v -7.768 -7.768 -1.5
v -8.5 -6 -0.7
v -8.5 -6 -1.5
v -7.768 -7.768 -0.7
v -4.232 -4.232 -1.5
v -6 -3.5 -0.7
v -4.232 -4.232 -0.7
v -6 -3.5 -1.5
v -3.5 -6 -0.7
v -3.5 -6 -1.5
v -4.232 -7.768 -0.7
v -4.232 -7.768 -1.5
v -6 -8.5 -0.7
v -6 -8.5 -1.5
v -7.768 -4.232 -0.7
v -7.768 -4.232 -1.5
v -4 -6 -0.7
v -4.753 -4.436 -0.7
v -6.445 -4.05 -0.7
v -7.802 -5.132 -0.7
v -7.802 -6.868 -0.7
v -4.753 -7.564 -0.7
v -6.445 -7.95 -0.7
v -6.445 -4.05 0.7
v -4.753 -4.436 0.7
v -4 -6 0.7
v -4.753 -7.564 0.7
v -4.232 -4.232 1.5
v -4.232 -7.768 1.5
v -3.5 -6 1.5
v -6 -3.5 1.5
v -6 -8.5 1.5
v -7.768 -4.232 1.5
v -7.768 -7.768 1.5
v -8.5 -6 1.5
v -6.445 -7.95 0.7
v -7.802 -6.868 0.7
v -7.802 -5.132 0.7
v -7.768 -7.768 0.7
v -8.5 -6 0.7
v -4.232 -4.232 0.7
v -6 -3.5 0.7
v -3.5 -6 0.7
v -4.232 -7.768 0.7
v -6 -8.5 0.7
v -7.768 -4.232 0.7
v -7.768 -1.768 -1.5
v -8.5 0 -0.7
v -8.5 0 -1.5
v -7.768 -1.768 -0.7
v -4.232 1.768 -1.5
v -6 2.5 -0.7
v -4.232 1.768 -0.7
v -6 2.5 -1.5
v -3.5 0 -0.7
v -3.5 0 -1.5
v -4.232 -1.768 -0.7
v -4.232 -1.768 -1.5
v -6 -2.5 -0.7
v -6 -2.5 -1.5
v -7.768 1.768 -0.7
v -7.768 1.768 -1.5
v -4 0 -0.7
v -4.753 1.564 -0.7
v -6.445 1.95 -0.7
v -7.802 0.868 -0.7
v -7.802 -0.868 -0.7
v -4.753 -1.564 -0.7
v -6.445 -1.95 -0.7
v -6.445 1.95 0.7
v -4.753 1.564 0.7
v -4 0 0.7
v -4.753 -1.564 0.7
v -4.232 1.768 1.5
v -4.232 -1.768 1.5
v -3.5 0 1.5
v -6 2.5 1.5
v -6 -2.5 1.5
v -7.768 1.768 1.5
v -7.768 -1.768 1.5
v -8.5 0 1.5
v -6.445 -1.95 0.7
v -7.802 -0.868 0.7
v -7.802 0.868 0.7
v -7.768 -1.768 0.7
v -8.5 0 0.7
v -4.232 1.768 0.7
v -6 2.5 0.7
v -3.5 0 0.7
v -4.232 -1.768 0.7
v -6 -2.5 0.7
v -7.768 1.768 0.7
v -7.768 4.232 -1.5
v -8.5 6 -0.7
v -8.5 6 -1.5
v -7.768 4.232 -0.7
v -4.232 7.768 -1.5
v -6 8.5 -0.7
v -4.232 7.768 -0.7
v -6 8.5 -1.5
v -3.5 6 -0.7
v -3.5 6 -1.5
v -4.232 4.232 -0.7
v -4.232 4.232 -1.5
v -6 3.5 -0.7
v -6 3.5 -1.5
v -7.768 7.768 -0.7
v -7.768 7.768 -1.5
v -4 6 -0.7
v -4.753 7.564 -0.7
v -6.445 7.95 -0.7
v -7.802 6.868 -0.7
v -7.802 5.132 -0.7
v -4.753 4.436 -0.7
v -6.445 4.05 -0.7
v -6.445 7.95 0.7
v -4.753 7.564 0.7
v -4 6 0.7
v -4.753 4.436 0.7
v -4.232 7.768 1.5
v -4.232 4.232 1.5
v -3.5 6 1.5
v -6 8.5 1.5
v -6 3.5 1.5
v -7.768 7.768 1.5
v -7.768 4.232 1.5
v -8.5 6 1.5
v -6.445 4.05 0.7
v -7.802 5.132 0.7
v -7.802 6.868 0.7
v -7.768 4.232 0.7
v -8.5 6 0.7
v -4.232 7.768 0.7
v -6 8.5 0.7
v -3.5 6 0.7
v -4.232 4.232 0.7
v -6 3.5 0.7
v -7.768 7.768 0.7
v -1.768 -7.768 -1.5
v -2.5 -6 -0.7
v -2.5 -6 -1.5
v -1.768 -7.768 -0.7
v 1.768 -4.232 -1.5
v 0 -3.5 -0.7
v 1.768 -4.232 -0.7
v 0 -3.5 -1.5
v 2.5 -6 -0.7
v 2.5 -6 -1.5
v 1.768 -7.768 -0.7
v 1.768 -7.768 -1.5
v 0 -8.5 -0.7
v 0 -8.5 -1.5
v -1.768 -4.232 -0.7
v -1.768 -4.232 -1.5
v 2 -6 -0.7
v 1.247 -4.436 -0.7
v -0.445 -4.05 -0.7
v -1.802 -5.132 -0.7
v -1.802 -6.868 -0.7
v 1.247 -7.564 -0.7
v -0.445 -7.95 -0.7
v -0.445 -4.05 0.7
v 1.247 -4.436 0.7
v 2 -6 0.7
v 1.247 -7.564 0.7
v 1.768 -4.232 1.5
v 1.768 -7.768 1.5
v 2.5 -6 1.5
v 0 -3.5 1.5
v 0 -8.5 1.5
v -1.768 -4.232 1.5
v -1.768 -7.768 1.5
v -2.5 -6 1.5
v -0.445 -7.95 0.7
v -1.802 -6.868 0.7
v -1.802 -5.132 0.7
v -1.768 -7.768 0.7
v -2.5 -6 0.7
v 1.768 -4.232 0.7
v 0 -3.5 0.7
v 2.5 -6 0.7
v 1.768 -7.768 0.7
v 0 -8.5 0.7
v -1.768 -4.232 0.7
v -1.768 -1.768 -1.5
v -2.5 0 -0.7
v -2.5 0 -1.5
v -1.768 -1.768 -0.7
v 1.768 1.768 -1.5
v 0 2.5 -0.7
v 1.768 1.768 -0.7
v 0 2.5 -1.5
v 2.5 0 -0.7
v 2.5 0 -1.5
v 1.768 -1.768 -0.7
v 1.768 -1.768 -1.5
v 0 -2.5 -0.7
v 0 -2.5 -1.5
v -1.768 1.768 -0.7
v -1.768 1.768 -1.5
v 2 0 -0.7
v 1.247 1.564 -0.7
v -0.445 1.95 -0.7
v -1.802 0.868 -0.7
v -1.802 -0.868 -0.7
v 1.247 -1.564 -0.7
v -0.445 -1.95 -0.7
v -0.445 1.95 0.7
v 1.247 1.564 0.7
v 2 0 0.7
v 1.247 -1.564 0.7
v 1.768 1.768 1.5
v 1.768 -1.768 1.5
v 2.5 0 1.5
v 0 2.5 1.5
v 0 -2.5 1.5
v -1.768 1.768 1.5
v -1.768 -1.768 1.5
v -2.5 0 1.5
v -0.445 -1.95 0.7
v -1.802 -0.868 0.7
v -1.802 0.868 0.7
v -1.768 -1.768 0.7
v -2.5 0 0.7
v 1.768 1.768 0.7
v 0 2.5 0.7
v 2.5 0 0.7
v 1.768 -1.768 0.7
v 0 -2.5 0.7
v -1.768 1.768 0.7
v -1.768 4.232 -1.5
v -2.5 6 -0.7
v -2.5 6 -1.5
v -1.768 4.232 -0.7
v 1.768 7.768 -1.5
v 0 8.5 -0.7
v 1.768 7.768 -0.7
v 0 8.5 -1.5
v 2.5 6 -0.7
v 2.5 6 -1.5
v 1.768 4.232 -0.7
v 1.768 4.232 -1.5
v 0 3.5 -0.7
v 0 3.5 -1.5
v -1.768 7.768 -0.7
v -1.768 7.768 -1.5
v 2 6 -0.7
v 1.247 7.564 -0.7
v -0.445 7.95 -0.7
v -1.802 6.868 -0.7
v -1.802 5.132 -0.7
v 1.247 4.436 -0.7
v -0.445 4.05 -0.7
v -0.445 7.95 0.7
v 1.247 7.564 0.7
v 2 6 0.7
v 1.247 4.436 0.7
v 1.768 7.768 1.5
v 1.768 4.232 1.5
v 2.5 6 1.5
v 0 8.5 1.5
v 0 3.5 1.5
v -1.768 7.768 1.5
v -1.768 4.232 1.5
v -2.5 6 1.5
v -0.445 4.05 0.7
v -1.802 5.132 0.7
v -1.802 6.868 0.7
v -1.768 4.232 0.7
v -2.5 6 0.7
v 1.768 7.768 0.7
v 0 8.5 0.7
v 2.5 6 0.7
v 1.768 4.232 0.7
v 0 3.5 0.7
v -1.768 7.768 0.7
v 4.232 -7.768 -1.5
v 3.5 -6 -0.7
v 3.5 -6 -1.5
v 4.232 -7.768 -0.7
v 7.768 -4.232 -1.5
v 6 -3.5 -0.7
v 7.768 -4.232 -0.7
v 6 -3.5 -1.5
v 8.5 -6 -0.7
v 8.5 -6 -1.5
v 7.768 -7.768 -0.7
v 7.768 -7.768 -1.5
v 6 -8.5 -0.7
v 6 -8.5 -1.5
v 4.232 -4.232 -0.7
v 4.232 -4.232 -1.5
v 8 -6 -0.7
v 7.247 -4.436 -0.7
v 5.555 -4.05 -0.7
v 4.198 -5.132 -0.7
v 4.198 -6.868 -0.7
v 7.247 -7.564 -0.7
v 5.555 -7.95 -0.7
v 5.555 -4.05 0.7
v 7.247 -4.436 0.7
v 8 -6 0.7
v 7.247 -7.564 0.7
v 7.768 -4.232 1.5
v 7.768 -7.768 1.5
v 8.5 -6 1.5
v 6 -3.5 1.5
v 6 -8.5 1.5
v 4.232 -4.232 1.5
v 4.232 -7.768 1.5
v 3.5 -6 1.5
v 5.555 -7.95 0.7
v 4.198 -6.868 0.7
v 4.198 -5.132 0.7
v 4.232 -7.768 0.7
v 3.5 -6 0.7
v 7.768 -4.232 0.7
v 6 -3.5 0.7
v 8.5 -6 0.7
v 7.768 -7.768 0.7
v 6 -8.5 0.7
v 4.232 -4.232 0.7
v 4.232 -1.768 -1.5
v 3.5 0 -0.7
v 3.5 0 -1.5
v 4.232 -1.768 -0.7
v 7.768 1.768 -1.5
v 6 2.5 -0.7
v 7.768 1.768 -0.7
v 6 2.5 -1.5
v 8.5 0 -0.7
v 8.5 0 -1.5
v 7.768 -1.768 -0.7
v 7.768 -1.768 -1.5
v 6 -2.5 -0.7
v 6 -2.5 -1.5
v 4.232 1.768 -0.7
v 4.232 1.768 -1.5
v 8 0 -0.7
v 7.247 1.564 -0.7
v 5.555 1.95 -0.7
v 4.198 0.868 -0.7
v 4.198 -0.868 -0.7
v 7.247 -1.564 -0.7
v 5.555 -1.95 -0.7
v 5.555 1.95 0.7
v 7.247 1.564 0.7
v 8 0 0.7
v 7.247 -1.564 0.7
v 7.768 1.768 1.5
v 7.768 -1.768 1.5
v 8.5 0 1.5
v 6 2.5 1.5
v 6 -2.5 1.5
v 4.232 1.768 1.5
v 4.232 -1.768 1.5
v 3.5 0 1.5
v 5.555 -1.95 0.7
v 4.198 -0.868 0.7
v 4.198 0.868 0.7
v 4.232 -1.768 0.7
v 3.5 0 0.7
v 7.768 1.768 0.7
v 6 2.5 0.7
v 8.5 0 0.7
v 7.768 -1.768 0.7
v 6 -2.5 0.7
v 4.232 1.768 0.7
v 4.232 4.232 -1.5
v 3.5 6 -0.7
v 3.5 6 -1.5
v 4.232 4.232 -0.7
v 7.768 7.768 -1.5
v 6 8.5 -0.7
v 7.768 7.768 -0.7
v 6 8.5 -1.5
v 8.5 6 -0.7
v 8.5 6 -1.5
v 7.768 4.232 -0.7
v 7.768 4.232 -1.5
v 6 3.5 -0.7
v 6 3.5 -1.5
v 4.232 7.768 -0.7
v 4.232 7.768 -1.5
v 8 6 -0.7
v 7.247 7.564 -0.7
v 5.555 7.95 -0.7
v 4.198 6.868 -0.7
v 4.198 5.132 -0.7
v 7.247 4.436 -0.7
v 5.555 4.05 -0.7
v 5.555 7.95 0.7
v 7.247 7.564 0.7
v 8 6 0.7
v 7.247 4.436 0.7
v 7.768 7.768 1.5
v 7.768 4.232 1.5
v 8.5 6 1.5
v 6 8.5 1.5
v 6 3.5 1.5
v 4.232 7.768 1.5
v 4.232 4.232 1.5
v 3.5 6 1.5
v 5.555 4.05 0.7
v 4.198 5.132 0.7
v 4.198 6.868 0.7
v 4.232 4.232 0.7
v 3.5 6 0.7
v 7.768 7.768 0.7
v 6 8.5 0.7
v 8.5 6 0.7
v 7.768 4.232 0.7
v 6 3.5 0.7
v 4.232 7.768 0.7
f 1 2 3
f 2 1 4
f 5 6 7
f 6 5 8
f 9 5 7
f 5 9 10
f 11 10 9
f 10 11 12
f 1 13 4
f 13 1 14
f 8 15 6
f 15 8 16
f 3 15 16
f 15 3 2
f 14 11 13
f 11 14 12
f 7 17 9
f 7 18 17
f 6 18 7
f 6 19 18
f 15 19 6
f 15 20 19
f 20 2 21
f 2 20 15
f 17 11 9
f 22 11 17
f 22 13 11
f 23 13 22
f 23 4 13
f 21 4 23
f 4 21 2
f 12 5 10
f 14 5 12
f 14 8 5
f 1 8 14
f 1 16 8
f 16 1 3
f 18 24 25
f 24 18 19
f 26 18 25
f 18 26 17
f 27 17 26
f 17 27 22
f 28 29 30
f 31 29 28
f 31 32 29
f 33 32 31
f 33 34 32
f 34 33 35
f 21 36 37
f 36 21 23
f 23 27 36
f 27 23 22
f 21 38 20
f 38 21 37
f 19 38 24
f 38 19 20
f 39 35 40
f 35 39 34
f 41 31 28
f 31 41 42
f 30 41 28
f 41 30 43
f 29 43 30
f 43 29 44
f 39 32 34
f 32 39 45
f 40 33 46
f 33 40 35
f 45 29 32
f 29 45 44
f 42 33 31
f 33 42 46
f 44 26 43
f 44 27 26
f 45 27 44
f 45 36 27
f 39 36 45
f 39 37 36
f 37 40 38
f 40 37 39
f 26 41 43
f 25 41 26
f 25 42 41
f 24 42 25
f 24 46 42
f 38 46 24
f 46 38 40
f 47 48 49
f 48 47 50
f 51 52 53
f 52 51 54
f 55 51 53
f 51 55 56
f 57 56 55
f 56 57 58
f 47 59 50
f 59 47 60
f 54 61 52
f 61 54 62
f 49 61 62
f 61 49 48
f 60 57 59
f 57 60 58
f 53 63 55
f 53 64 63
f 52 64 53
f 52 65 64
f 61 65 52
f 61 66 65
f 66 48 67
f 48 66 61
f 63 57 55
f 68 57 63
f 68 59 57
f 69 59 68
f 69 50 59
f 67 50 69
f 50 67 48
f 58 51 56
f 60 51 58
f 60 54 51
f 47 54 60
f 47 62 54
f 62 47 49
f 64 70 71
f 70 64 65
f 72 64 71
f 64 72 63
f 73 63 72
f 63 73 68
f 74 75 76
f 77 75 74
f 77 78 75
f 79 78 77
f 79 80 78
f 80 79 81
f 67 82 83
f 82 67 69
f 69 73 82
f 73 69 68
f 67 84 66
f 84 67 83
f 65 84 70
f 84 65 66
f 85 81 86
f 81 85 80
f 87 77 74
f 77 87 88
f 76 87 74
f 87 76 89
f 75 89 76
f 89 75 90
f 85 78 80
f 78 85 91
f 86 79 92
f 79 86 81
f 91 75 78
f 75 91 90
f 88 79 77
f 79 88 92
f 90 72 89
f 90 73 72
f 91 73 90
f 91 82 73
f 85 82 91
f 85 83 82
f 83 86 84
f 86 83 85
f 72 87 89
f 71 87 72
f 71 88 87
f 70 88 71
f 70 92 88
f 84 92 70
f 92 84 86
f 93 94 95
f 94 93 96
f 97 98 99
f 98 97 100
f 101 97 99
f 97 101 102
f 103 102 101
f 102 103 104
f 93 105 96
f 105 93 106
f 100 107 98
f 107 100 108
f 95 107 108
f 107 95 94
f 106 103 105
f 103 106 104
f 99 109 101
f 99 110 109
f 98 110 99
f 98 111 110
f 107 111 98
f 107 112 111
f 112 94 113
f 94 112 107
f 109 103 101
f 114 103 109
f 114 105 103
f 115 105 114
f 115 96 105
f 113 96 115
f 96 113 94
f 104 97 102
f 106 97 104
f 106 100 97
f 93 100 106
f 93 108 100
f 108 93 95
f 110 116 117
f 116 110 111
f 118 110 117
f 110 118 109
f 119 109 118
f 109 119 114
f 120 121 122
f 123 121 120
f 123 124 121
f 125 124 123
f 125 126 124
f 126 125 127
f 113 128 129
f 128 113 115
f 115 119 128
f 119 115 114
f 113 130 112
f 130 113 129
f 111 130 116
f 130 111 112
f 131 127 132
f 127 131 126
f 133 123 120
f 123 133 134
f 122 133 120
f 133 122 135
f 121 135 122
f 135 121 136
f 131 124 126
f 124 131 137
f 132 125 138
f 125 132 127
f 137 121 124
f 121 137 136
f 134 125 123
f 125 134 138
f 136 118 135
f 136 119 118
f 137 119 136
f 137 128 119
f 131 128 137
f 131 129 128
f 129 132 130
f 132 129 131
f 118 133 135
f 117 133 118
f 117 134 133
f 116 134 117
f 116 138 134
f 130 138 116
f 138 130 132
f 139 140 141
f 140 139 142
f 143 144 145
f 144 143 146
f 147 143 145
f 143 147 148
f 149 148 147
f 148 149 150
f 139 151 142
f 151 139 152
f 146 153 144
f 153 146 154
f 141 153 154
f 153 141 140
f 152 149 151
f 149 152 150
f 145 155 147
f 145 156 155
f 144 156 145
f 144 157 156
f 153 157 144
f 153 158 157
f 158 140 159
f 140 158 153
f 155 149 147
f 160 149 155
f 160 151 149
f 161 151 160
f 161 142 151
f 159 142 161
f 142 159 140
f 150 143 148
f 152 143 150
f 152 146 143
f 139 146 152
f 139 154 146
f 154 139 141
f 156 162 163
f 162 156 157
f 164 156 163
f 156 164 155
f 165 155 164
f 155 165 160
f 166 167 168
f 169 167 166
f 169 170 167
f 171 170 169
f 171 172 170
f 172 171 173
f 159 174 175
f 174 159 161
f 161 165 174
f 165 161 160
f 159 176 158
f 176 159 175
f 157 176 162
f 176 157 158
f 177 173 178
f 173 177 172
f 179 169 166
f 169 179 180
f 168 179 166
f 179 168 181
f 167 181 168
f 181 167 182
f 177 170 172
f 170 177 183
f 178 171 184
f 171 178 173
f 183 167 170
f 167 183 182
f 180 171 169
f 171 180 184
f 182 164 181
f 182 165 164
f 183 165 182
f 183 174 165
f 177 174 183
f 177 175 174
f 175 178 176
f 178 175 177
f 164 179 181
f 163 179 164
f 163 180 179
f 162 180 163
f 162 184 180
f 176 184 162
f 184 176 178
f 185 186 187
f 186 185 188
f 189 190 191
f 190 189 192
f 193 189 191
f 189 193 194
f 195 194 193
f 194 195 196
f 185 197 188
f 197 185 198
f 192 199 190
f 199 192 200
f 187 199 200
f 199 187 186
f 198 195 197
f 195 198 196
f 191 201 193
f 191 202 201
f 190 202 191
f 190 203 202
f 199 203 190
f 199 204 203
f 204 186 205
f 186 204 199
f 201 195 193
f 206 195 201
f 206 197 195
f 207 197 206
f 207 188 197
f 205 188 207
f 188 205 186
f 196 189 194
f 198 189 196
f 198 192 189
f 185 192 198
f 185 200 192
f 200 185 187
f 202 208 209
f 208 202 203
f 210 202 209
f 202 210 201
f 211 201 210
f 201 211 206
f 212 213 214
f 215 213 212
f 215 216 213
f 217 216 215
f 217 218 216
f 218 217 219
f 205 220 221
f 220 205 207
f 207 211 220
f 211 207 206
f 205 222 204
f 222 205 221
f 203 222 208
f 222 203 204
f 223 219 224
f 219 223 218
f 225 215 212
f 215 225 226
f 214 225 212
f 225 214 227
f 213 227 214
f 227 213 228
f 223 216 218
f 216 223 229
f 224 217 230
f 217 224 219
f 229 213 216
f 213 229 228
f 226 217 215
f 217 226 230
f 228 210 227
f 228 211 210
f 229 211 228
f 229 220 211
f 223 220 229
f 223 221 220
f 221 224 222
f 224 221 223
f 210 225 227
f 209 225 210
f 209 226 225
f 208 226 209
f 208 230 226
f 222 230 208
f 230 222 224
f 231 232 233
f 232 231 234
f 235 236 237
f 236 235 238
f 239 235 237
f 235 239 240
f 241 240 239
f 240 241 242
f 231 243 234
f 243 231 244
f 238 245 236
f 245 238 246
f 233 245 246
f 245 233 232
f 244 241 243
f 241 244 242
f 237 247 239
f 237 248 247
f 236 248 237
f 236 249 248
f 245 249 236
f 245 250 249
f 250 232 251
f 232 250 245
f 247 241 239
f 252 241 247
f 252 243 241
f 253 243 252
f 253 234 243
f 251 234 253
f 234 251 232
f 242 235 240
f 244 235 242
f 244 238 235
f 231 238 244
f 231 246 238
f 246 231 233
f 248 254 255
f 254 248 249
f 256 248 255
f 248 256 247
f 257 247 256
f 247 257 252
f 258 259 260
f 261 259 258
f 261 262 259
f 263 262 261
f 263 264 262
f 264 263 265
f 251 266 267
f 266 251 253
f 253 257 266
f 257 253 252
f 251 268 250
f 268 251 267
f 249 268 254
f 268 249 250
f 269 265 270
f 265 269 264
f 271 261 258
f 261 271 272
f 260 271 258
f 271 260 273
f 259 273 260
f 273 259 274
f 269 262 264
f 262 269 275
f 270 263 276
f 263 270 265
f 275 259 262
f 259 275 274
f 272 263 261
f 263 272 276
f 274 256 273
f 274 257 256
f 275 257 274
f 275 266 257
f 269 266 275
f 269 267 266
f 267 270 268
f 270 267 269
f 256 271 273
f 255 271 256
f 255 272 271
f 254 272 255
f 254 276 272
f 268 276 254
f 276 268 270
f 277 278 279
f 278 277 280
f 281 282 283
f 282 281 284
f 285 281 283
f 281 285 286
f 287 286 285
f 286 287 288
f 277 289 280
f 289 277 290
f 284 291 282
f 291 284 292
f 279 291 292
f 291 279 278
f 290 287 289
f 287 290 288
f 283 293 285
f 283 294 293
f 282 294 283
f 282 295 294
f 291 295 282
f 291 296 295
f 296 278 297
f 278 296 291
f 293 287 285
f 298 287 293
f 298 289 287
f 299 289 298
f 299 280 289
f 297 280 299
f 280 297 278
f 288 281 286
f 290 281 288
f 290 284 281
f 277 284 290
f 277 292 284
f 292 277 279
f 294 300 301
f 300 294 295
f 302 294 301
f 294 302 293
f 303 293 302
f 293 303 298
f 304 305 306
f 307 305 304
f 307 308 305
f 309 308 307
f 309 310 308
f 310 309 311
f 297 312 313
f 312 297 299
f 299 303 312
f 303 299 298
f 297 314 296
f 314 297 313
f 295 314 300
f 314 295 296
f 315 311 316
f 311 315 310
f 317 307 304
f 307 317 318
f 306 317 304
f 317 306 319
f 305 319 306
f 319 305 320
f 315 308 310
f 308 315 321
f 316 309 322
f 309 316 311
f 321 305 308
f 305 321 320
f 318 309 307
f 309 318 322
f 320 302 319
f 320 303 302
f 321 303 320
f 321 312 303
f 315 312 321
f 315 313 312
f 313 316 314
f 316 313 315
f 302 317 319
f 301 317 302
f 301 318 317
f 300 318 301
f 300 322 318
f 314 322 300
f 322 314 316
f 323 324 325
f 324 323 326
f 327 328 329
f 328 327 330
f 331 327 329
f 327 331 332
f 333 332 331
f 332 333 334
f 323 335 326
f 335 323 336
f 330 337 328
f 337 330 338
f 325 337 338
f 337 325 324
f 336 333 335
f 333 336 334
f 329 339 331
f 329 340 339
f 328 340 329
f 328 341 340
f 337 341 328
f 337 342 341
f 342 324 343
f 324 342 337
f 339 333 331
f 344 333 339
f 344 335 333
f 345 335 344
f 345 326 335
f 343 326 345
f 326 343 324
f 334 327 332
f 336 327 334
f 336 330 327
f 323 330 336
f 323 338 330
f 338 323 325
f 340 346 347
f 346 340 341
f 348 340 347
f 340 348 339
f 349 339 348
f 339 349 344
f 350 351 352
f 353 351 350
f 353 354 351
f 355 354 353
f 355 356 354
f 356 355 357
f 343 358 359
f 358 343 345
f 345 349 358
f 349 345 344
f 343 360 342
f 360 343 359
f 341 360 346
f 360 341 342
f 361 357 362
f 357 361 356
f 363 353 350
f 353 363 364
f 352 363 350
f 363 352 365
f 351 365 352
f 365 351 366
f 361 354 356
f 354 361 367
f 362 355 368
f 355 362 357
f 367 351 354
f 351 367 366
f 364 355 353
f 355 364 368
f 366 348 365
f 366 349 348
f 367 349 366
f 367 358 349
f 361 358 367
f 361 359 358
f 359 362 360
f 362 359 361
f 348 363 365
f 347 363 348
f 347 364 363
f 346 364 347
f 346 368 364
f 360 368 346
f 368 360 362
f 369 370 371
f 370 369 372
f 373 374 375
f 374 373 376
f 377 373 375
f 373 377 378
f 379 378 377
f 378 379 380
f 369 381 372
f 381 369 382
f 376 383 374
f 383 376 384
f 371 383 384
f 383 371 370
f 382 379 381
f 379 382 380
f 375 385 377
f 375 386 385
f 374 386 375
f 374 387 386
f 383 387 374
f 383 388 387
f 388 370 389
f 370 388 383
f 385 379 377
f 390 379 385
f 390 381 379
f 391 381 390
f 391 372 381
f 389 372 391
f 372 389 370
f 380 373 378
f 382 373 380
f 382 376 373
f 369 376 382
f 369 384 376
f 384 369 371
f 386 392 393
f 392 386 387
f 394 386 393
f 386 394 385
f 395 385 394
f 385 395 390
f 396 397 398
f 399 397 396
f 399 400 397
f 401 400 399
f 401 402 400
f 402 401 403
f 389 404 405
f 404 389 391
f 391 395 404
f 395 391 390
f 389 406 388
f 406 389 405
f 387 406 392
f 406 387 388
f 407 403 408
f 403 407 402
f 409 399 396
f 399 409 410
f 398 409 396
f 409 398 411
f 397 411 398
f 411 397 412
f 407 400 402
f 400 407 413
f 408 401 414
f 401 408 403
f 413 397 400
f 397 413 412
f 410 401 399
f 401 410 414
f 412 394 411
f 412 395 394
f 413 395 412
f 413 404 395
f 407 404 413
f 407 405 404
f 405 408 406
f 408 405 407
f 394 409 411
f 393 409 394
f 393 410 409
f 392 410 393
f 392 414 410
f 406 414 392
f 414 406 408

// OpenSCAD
// file: ollo_def.scad
// Diameter of the body of Ollo Rivet
OlloInDiameter = 4;

// Diameter of the tip of Ollo Rivet
OlloOutDiameter = 5;

// Depth of one layer of Ollo Rivet
OlloLayerThickness = 3;

// Depth of tip of Ollo Rivet
OlloTipThickness = 0.8;

// Distance between two Ollo holes centers
OlloSpacing = 6;

// Functions
function ollo_nLayer_thickness(nLayer) = nLayer*OlloLayerThickness;
// main file
include <ollo_def.scad>;

// One Ollo hole
module olloHole(nLayer=1, outerBottom=true, outerTop=true, innerDiameter=OlloInDiameter, outerDiameter=OlloOutDiameter)
{
  TotalThickness = ollo_nLayer_thickness(nLayer);

  if (outerBottom)
    translate([0, 0, -TotalThickness/2 + OlloTipThickness/2])
      cylinder(OlloTipThickness, outerDiameter/2, outerDiameter/2, center=true);

  cylinder(TotalThickness, innerDiameter/2, innerDiameter/2, center=true);

  if (outerTop)
    translate([0, 0, TotalThickness/2 - OlloTipThickness/2])
      cylinder(OlloTipThickness, outerDiameter/2, outerDiameter/2, center=true);
}

// 3 ollo holes (spacing as needed for motors)
module threeOlloHoles(nLayer=1, outerBottom=true, outerTop=true,  innerDiameter=OlloInDiameter, outerDiameter=OlloOutDiameter)
{
    for (xy=[[-OlloSpacing,0], [0,0], [OlloSpacing,0]]) {
      translate([xy[0], xy[1], 0])
        olloHole(nLayer, outerBottom, outerTop, innerDiameter, outerDiameter);
    }
}

// 5 ollo holes in a cross shape (spacing as needed for motor axes)
module crossOlloHoles(nLayer=1, outerBottom=true, outerTop=true, innerDiameter=OlloInDiameter, outerDiameter=OlloOutDiameter)
{
    threeOlloHoles(nLayer, outerBottom, outerTop, innerDiameter, outerDiameter);
    rotate([0, 0, 90])
      threeOlloHoles(nLayer, outerBottom, outerTop, innerDiameter, outerDiameter);
}

// x times y holes
module gridOlloHoles(XYGridSize=[1,1], center= true, nLayer=1, outerBottom=true, outerTop=true, innerDiameter=OlloInDiameter, outerDiameter=OlloOutDiameter)
{
  if (center) {
    translate([-(XYGridSize[0]-1)*OlloSpacing/2,-(XYGridSize[1]-1)*OlloSpacing/2, 0])
      gridOlloHoles(XYGridSize, false, nLayer, outerBottom, outerTop, innerDiameter, outerDiameter);

  } else {
    for ( i = [0 : XYGridSize[0]-1]) {
      for ( j = [0 : XYGridSize[1]-1]) {
        translate([i*OlloSpacing, j*OlloSpacing, 0])
          olloHole(nLayer, outerBottom, outerTop, innerDiameter, outerDiameter);
      }
    }
  }
}


// Testing
echo("##########");
echo("In ollo_tools.scad");
echo("This file should not be included, use ''use <filemane>'' instead.");
echo("##########");

p = 4;
if (p == 1) olloHole();
if (p == 2) threeOlloHoles(2,true,false);
if (p == 3) crossOlloHoles(3,false,true);
if (p == 4) gridOlloHoles([3,3], center=true);
